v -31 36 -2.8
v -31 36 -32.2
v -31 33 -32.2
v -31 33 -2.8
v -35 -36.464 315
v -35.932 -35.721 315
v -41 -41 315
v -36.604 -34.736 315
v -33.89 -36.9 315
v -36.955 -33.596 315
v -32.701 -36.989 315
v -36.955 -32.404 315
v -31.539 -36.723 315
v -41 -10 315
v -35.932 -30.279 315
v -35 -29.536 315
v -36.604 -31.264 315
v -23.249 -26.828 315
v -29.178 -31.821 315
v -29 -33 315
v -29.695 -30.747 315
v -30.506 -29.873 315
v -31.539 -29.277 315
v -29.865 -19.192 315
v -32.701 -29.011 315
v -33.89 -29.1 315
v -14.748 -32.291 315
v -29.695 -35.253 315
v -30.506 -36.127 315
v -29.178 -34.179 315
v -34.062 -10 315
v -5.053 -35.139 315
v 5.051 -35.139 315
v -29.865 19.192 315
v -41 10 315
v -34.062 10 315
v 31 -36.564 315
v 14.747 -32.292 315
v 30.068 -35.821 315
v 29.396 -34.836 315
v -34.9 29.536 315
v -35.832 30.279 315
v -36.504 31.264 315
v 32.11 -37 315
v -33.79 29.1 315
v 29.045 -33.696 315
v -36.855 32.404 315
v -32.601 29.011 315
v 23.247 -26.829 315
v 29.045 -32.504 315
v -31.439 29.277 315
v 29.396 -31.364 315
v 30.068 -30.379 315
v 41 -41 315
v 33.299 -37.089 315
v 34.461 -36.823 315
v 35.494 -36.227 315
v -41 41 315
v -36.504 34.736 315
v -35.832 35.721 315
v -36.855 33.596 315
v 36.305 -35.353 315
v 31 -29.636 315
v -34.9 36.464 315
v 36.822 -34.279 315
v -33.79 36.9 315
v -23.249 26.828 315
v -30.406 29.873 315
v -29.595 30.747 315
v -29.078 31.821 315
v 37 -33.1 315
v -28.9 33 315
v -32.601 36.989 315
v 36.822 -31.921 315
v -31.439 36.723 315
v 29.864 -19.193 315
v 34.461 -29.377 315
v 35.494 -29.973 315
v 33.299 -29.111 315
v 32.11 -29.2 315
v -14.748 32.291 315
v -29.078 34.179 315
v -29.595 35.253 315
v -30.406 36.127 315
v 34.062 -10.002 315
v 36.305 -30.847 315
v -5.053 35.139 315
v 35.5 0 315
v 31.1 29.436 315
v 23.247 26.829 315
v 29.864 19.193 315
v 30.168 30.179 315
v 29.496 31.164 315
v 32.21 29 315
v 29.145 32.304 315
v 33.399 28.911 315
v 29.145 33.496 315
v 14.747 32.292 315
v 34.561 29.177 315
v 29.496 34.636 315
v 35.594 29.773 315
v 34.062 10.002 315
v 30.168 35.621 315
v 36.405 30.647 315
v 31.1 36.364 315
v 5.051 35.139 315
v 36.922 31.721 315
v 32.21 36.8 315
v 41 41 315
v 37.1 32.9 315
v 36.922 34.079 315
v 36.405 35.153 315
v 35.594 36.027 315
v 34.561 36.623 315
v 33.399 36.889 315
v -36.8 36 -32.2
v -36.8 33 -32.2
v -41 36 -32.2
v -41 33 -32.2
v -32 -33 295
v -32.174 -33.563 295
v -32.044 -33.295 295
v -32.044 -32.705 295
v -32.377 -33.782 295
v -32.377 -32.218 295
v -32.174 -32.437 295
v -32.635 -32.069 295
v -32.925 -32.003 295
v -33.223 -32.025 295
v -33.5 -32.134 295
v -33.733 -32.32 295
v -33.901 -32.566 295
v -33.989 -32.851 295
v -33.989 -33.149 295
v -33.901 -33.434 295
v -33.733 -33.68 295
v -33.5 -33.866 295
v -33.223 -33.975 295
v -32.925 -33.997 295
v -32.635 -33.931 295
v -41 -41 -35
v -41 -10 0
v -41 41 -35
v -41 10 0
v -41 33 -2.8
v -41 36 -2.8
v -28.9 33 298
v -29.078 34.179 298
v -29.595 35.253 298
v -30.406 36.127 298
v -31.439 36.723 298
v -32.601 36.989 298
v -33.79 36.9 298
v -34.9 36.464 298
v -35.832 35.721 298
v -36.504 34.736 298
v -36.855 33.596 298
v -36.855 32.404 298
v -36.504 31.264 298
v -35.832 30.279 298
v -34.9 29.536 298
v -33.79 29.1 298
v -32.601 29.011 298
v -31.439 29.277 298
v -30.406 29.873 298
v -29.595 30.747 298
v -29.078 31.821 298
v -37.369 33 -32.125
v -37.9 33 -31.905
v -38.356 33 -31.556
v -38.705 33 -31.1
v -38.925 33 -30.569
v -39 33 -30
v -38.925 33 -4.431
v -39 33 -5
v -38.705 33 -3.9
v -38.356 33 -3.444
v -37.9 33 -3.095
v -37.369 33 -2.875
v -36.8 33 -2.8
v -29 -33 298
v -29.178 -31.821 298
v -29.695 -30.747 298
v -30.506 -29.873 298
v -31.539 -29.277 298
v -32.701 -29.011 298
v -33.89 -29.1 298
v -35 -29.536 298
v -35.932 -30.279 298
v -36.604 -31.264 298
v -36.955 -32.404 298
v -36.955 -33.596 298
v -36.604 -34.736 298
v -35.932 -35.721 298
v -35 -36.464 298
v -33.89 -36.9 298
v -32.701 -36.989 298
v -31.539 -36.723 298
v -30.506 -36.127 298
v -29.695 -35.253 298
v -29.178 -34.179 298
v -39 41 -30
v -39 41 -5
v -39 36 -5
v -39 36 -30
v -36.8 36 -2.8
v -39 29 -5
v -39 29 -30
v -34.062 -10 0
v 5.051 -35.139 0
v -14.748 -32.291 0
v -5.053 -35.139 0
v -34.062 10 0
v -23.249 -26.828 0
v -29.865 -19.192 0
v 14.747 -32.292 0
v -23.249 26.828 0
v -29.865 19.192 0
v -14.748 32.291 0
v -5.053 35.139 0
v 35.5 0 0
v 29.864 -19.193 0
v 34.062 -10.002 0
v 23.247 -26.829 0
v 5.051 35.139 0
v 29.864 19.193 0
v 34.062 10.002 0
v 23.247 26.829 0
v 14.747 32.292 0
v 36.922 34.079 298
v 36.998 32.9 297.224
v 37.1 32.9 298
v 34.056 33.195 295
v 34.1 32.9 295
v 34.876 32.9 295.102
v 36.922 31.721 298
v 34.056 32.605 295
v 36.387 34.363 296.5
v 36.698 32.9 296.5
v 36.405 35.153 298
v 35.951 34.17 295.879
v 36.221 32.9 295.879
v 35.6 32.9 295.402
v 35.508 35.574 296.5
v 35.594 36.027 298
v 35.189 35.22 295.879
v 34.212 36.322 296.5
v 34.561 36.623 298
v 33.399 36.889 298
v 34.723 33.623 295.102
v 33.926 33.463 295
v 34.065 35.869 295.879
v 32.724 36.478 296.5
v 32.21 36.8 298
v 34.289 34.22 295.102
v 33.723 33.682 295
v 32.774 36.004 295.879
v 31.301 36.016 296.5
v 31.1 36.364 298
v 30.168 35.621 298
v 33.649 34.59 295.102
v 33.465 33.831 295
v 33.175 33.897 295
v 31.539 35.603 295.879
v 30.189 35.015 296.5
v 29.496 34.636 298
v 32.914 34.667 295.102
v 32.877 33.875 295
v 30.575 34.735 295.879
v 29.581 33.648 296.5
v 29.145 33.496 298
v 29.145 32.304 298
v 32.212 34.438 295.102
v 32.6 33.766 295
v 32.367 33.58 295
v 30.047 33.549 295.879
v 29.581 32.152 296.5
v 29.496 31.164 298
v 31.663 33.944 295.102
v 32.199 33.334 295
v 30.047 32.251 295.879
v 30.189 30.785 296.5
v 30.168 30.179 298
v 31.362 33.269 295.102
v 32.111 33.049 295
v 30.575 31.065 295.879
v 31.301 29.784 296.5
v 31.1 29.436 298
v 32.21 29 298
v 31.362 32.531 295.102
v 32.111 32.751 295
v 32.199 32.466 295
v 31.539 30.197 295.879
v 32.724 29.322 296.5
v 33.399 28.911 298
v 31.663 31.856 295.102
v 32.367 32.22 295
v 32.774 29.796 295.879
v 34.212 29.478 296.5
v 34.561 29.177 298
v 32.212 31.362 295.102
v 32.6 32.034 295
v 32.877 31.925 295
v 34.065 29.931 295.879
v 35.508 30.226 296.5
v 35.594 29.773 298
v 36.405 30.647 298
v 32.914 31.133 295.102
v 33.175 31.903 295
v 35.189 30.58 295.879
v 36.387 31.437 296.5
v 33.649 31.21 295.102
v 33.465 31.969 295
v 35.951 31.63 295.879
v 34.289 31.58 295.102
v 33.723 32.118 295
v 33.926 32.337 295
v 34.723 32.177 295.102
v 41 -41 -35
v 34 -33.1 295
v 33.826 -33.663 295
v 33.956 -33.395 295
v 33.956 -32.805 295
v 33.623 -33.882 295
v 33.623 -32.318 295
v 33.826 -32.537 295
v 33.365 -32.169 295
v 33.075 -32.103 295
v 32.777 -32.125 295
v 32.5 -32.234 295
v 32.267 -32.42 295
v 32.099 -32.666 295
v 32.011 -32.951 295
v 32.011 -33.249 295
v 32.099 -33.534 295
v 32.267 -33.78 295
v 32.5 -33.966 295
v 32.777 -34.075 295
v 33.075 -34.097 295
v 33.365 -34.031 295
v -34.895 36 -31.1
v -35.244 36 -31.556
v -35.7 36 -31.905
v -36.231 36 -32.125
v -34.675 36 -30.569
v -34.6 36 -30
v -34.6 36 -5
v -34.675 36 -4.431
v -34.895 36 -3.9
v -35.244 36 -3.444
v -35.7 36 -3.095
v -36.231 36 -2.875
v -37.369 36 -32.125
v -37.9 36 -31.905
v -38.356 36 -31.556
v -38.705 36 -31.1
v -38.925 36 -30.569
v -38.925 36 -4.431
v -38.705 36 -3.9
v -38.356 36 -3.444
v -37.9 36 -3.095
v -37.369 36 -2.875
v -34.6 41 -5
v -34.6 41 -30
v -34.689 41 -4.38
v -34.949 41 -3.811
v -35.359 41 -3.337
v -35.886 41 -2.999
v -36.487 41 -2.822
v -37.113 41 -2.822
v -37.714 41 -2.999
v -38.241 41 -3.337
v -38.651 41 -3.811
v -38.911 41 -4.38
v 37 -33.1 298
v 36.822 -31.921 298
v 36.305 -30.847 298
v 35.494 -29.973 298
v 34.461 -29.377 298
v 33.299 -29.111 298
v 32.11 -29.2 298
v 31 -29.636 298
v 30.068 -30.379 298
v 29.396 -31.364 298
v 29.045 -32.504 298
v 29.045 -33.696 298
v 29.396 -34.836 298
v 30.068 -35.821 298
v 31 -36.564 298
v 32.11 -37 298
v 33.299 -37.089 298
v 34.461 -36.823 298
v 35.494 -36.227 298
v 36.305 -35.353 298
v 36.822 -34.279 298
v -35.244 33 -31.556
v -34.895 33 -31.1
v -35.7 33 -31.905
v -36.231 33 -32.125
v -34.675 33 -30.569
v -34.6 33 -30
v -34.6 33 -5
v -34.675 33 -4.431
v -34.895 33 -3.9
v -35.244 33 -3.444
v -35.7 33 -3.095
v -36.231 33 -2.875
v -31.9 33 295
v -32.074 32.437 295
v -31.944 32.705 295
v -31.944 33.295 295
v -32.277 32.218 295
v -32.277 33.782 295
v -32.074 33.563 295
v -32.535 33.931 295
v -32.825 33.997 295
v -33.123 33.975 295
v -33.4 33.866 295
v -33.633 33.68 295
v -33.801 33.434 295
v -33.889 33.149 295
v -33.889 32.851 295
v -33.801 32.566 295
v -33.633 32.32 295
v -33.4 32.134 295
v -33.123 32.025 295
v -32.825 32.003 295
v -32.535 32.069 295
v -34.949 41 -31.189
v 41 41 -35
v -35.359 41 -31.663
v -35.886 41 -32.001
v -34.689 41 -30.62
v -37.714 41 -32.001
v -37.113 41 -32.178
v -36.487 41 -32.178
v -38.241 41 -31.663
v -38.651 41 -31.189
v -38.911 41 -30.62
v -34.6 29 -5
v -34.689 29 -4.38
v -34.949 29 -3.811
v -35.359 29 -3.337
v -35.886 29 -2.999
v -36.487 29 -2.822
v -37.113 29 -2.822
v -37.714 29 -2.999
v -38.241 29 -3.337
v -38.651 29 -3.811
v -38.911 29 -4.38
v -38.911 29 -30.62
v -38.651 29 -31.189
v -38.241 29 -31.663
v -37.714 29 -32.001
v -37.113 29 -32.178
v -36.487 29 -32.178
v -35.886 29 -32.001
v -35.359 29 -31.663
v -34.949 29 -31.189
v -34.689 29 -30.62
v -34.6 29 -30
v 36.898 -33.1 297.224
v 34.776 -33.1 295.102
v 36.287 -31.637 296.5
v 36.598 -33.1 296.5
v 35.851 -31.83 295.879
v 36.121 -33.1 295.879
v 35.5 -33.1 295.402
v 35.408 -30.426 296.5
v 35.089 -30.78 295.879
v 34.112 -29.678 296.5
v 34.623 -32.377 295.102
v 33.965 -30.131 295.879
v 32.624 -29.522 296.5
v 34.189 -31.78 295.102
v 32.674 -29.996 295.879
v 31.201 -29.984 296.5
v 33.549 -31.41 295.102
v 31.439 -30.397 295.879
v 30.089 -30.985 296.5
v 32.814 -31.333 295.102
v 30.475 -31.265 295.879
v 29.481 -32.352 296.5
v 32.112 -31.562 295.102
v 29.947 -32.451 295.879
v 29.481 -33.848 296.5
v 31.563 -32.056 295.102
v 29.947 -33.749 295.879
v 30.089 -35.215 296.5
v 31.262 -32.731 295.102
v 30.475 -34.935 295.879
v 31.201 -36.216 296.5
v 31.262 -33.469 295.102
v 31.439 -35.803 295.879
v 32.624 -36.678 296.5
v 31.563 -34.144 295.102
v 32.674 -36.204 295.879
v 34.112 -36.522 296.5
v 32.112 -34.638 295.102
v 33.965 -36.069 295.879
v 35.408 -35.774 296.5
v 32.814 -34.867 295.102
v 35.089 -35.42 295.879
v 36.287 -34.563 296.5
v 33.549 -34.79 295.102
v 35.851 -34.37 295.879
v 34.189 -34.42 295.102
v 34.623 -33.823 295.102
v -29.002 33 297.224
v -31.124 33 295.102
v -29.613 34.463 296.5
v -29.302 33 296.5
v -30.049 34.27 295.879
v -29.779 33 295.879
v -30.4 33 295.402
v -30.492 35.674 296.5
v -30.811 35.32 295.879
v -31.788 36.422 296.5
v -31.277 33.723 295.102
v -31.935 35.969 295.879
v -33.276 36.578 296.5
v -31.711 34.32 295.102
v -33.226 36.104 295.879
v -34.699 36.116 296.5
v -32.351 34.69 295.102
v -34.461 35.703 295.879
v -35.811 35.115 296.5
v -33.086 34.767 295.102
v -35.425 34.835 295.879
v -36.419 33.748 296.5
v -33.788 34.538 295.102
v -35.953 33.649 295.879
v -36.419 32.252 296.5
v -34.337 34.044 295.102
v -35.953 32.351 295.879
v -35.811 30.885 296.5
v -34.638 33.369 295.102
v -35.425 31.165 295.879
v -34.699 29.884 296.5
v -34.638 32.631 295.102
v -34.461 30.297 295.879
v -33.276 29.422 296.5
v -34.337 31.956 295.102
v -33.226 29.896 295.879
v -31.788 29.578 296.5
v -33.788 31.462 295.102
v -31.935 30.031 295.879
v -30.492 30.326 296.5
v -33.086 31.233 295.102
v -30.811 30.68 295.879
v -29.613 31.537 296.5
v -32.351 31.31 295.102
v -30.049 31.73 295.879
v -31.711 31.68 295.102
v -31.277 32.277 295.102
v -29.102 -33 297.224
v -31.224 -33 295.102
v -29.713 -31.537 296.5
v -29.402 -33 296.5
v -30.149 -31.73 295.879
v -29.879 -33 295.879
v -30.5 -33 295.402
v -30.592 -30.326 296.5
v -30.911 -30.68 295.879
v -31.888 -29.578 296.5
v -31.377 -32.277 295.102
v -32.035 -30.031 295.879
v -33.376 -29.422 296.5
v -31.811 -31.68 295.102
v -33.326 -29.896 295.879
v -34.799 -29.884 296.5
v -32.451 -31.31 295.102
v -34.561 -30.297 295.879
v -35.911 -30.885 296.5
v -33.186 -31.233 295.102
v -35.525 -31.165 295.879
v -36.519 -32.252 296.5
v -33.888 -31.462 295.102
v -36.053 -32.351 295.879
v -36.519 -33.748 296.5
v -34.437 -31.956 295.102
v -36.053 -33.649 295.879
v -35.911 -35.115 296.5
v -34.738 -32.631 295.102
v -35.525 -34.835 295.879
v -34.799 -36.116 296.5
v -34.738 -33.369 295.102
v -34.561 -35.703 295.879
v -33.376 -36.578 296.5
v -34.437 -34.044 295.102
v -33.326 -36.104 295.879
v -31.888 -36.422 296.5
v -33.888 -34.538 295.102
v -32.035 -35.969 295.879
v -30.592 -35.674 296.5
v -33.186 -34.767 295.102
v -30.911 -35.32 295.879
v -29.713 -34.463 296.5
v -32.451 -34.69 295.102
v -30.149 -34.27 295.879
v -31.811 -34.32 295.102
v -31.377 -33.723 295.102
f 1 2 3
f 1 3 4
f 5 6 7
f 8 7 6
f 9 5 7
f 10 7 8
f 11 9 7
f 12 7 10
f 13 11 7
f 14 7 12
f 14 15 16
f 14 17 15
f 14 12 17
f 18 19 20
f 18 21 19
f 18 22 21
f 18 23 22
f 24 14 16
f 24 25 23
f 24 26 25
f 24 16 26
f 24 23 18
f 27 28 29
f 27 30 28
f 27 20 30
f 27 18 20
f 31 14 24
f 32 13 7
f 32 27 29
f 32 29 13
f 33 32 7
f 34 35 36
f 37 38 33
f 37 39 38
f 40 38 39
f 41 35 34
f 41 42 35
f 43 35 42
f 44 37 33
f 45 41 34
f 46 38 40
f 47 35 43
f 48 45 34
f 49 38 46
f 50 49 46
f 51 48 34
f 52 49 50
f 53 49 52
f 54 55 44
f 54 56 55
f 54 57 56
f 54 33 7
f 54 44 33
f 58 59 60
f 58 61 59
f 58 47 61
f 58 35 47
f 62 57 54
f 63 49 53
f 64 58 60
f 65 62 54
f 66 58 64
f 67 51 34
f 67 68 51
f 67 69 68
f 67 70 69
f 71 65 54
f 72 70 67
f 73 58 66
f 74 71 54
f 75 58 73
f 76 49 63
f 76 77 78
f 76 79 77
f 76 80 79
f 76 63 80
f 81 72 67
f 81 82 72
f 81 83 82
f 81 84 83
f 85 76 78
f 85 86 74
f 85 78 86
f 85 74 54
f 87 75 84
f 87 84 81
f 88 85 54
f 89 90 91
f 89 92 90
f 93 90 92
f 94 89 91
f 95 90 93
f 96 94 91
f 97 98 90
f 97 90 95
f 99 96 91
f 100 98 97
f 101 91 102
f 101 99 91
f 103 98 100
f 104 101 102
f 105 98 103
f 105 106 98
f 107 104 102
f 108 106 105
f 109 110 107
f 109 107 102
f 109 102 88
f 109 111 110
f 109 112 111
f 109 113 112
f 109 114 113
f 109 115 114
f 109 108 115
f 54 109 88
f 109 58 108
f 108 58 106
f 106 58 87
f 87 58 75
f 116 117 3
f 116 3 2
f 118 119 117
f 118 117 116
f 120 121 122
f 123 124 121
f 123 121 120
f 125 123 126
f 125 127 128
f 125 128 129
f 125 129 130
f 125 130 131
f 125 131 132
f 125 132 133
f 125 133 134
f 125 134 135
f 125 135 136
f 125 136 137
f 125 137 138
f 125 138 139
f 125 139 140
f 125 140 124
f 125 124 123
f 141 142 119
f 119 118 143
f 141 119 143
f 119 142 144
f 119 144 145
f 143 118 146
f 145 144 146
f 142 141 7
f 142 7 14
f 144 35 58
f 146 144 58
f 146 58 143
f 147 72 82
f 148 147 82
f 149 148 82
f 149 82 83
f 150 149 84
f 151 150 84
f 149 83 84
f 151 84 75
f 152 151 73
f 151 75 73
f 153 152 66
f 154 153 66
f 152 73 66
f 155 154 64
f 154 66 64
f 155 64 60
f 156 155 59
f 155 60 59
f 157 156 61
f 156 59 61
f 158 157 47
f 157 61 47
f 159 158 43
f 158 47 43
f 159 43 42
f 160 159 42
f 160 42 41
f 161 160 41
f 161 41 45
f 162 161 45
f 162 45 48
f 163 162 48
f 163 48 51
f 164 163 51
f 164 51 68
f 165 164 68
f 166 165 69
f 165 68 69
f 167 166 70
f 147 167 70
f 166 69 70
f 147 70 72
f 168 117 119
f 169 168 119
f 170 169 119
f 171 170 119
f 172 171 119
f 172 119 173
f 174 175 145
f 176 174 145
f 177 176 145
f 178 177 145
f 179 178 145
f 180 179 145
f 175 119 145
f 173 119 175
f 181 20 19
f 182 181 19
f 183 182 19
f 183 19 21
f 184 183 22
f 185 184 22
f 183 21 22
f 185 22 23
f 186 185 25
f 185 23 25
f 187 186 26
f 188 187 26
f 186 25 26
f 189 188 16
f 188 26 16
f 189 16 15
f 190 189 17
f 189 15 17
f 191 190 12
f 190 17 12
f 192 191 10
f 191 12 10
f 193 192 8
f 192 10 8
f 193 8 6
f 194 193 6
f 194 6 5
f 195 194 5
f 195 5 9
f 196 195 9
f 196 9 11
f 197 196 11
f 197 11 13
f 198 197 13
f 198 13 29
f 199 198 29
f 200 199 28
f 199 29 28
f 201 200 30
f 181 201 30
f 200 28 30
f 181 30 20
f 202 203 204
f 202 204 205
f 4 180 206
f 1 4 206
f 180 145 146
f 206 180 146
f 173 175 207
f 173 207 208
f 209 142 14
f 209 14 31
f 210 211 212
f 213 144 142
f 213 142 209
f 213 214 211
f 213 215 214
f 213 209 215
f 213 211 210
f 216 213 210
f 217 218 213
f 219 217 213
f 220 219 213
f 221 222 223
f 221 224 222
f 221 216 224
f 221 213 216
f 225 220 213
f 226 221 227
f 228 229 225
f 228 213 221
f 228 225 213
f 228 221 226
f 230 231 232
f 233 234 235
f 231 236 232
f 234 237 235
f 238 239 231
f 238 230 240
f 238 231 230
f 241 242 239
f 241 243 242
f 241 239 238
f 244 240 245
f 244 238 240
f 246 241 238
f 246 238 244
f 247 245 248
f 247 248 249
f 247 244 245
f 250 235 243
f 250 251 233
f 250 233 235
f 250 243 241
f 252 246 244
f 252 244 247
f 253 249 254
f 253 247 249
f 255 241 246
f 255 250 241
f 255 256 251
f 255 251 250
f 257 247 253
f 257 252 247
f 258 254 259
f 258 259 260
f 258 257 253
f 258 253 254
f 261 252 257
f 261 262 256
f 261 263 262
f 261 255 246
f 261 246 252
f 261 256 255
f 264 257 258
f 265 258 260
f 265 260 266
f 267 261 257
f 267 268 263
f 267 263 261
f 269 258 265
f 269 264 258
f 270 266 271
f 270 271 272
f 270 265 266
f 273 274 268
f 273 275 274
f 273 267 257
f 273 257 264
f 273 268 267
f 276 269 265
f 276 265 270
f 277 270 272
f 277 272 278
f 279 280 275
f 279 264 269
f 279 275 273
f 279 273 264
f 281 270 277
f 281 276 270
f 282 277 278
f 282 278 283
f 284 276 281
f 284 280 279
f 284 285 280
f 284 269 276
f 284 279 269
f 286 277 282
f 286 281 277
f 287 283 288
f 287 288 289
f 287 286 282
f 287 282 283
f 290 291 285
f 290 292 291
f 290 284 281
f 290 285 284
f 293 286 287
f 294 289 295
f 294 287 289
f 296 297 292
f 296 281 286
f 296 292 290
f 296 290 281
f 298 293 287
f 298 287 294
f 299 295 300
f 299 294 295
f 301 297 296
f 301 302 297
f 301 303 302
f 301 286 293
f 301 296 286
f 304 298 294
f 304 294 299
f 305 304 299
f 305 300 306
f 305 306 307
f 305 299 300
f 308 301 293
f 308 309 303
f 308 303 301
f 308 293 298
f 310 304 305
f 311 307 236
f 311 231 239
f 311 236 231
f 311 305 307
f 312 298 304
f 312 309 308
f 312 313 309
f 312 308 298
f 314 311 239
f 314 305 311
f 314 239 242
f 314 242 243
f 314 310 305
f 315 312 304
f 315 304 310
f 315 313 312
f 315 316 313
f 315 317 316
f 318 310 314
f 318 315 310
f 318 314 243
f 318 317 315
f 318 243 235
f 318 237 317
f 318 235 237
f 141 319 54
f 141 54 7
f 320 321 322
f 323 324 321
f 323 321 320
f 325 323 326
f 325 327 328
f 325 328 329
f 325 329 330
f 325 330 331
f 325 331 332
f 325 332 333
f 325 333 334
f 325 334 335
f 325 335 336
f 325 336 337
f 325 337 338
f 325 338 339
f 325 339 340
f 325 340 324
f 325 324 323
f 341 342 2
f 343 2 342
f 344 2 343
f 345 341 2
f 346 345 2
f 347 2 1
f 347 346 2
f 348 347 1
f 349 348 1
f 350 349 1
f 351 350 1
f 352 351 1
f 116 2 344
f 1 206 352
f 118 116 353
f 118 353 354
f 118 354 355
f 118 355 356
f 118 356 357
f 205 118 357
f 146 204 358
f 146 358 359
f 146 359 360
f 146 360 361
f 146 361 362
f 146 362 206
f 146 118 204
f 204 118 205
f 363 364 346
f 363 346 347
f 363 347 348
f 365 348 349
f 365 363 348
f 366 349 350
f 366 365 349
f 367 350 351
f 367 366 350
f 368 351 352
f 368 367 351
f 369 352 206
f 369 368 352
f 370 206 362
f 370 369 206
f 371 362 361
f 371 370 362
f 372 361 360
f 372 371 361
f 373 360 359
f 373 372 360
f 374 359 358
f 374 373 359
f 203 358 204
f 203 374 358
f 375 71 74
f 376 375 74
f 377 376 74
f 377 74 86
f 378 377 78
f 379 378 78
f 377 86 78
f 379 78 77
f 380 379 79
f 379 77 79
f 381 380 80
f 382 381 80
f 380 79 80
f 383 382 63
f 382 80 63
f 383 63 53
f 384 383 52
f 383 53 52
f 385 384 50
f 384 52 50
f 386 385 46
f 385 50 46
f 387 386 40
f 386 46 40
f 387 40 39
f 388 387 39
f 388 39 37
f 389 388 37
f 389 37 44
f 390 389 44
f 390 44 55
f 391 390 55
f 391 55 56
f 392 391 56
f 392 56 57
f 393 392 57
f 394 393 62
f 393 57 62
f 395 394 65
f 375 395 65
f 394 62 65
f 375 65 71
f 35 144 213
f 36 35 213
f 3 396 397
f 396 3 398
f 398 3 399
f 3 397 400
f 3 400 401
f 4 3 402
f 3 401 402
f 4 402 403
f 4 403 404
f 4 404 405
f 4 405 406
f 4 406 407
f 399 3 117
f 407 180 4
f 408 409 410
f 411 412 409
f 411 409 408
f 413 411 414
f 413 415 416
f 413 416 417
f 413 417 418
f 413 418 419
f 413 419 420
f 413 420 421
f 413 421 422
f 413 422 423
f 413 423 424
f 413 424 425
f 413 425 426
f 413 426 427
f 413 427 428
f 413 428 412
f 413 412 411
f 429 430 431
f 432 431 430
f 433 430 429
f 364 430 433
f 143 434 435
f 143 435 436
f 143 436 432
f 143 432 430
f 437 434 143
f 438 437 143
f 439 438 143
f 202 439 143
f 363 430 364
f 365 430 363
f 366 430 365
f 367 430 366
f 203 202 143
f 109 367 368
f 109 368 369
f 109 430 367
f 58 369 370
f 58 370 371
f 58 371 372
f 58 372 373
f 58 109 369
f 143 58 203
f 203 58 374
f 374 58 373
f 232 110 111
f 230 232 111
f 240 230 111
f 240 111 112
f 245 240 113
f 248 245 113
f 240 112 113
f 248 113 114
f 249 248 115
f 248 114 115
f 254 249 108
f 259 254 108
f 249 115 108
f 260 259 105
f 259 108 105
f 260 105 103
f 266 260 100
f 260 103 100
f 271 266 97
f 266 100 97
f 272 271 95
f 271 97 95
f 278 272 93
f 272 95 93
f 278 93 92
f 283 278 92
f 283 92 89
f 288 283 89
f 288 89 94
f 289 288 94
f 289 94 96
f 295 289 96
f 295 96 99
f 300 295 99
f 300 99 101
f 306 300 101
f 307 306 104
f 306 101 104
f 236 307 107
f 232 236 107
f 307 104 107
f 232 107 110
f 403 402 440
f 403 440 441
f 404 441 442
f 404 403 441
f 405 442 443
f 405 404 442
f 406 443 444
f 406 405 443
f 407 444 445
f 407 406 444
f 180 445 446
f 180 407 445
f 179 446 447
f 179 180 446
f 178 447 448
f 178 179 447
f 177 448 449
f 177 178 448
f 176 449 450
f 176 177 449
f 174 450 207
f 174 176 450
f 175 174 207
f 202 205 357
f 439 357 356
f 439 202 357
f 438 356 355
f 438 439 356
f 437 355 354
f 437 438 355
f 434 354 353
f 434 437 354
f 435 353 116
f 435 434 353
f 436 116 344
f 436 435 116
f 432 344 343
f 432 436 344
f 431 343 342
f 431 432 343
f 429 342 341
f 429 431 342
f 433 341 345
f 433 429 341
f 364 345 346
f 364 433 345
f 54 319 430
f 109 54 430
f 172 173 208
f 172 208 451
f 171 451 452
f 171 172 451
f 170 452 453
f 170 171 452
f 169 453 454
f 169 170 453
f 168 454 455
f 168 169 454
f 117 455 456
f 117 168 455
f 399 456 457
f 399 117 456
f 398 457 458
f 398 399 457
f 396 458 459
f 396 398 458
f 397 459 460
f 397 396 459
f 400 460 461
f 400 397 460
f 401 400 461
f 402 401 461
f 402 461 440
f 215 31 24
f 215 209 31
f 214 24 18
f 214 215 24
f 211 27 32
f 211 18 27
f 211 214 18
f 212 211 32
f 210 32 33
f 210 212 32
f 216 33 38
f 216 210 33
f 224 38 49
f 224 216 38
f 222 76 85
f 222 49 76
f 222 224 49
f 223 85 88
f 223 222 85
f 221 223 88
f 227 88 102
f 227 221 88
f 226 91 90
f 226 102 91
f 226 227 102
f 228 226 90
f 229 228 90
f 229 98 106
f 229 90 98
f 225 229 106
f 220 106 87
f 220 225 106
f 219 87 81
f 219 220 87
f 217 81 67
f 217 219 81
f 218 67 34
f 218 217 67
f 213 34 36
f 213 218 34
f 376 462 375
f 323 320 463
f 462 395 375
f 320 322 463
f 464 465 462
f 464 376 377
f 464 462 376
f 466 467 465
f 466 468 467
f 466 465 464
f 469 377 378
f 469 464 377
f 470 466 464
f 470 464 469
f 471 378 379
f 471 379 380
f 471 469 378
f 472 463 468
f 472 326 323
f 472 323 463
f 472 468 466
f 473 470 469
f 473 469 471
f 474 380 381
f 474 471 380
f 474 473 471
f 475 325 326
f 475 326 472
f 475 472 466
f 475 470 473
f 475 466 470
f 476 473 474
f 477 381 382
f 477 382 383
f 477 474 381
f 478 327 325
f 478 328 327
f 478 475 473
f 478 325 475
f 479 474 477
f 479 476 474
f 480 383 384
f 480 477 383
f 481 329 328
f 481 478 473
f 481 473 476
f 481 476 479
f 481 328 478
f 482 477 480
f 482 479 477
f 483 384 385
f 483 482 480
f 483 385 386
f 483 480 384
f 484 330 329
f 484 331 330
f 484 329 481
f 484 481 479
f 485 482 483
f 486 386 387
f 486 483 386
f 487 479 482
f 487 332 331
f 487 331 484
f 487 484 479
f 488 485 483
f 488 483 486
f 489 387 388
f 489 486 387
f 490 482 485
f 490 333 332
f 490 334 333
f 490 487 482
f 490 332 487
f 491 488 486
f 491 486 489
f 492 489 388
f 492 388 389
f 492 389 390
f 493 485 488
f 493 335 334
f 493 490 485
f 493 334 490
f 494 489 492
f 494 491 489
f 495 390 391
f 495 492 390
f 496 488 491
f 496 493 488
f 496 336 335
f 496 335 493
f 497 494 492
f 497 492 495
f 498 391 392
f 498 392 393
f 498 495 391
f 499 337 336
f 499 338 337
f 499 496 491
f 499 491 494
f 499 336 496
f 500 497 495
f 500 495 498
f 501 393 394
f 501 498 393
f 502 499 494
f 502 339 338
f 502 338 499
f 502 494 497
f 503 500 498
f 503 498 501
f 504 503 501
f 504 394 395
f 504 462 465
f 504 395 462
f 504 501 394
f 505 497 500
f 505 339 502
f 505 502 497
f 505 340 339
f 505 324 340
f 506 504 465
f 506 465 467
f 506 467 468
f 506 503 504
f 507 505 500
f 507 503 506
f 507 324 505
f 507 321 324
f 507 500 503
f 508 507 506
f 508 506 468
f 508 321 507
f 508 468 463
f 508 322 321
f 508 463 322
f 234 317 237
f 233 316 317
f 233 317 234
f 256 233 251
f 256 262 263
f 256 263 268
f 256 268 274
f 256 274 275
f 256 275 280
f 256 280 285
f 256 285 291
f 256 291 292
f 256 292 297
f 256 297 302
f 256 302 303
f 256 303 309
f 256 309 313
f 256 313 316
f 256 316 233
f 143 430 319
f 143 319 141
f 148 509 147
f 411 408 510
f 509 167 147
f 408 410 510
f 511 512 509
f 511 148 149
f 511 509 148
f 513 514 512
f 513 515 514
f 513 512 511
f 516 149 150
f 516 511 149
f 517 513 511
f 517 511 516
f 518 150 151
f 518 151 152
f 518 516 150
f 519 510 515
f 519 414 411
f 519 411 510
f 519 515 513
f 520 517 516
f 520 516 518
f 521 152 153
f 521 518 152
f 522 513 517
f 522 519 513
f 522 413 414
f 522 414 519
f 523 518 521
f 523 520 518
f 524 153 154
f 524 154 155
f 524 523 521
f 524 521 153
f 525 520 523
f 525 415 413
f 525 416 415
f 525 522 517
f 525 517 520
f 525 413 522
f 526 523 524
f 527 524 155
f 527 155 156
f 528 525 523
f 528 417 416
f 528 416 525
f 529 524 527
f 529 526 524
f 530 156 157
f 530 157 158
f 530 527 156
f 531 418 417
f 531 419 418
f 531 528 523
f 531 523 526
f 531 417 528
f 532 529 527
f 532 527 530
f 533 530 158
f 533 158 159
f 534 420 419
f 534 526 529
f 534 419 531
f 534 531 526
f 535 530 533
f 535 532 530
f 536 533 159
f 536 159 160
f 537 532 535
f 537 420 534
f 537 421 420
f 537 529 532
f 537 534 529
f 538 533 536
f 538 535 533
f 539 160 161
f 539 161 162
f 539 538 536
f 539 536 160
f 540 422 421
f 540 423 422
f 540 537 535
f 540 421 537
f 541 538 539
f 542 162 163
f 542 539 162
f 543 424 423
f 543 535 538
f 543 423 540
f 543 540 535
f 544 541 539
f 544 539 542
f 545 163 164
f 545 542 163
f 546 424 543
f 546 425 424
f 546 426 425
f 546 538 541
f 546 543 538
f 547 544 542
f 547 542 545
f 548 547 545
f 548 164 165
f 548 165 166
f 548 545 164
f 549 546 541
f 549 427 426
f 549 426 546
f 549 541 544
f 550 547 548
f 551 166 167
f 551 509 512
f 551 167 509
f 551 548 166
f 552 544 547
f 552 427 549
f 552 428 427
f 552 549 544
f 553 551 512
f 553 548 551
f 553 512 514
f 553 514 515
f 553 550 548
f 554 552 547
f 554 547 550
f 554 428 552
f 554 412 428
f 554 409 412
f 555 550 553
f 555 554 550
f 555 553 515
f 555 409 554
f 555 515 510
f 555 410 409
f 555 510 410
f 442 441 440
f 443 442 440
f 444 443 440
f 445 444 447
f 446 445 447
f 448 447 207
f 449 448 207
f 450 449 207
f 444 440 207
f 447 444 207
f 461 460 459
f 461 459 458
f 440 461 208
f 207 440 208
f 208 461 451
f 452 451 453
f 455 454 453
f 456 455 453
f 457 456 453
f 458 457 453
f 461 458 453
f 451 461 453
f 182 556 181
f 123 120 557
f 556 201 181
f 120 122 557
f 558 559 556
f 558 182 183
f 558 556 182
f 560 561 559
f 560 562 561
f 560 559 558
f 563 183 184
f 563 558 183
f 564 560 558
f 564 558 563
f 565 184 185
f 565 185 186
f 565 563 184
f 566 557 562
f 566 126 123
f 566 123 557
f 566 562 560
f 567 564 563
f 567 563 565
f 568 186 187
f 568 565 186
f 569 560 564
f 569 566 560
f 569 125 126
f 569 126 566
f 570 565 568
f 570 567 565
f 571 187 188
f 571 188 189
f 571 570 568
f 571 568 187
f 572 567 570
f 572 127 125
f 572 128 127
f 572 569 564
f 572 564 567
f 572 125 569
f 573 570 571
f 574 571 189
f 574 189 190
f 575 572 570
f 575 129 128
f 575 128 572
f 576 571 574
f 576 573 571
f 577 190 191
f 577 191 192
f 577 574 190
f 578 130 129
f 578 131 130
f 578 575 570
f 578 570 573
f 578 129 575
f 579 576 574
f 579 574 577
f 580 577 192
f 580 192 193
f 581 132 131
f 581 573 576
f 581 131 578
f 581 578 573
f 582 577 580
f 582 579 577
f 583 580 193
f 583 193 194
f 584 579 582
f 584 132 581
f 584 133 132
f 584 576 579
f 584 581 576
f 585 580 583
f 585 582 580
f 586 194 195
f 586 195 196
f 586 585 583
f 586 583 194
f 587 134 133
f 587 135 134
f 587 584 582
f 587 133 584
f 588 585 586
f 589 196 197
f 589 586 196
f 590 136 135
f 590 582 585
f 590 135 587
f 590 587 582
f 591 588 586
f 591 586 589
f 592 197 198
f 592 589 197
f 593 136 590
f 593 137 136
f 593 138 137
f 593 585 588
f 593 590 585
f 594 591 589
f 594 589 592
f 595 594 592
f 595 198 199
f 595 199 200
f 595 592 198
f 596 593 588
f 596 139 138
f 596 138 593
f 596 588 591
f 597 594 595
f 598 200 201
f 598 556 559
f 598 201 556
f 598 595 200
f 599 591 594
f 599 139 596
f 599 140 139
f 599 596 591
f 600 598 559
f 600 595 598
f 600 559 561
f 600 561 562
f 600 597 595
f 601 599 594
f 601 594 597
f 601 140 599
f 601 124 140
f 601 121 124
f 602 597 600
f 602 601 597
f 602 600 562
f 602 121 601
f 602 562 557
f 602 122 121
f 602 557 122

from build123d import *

# Parameters (mm, degrees)
SKETCH_1_W          = 82
SKETCH_1_H          = 82
SKETCH_1_R          = 35.5
EXTRUDE_1_DEPTH     = 315
SKETCH_2_W          = 82
SKETCH_2_H          = 82
EXTRUDE_2_DEPTH     = 35
SKETCH_3_W          = 8
SKETCH_3_H          = 20
CUT_EXTRUDE_1_DEPTH = 315
SKETCH_4_R          = 4
CUT_EXTRUDE_2_DEPTH = 20
FILLET_2_R          = 3
FILLET_3_R          = 3
FILLET_4_R          = 3
FILLET_5_R          = 3
CUT_EXTRUDE_3_DEPTH = 12
SKETCH_6_W          = 29.4
SKETCH_6_H          = 3
CUT_EXTRUDE_4_DEPTH = 10


with BuildPart() as part:
    # 草圖1 → 填料-伸長1 (new body)
    with BuildSketch(Plane.XY):
        Rectangle(SKETCH_1_W, SKETCH_1_H)
        Circle(SKETCH_1_R, mode=Mode.SUBTRACT)
    extrude(amount=EXTRUDE_1_DEPTH)

    # 草圖2 → 填料-伸長2 (add)
    with BuildSketch(Plane(origin=(0, 0, 0), x_dir=(-1, 0, 0), z_dir=(0, 0, -1))):
        Rectangle(SKETCH_2_W, SKETCH_2_H)
    extrude(amount=EXTRUDE_2_DEPTH)

    # 草圖3 → 除料-伸長1 (cut)
    with BuildSketch(Plane.XY.offset(315)):
        with Locations((-37, 0)):
            Rectangle(SKETCH_3_W, SKETCH_3_H)
    extrude(amount=-CUT_EXTRUDE_1_DEPTH, mode=Mode.SUBTRACT)

    # 草圖4 → 除料-伸長2 (cut)
    with BuildSketch(Plane.XY.offset(315)):
        with Locations((-32.9, 33)):
            Circle(SKETCH_4_R)
        with Locations((33.1, 32.9)):
            Circle(SKETCH_4_R)
        with Locations((33, -33.1)):
            Circle(SKETCH_4_R)
        with Locations((-33, -33)):
            Circle(SKETCH_4_R)
    extrude(amount=-CUT_EXTRUDE_2_DEPTH, mode=Mode.SUBTRACT)

    # 圓角2
    fillet_2_edges = [part.edges().sort_by_distance(p)[0] for p in [
        (-36.9, 33, 295),
    ]]
    fillet(fillet_2_edges, radius=FILLET_2_R)

    # 圓角3
    fillet_3_edges = [part.edges().sort_by_distance(p)[0] for p in [
        (29.1, 32.9, 295),
    ]]
    fillet(fillet_3_edges, radius=FILLET_3_R)

    # 圓角4
    fillet_4_edges = [part.edges().sort_by_distance(p)[0] for p in [
        (-37, -33, 295),
    ]]
    fillet(fillet_4_edges, radius=FILLET_4_R)

    # 圓角5
    fillet_5_edges = [part.edges().sort_by_distance(p)[0] for p in [
        (29, -33.1, 295),
    ]]
    fillet(fillet_5_edges, radius=FILLET_5_R)

    # 草圖5 → 除料-伸長3 (cut)
    with BuildSketch(Plane(origin=(0, 41, 0), x_dir=(1, 0, 0), z_dir=(0, 1, 0))):
        with BuildLine():
            Line((-39, 5), (-39, 30))
            ThreePointArc((-39, 30), (-36.8, 32.2), (-34.6, 30))
            Line((-34.6, 30), (-34.6, 5))
            ThreePointArc((-34.6, 5), (-36.8, 2.8), (-39, 5))
        make_face()
    extrude(amount=-CUT_EXTRUDE_3_DEPTH, mode=Mode.SUBTRACT)

    # 草圖6 → 除料-伸長4 (cut)
    with BuildSketch(Plane.ZY.offset(41)):
        with Locations((-17.5, 34.5)):
            Rectangle(SKETCH_6_W, SKETCH_6_H)
    extrude(amount=-CUT_EXTRUDE_4_DEPTH, mode=Mode.SUBTRACT)


solid = part.part
